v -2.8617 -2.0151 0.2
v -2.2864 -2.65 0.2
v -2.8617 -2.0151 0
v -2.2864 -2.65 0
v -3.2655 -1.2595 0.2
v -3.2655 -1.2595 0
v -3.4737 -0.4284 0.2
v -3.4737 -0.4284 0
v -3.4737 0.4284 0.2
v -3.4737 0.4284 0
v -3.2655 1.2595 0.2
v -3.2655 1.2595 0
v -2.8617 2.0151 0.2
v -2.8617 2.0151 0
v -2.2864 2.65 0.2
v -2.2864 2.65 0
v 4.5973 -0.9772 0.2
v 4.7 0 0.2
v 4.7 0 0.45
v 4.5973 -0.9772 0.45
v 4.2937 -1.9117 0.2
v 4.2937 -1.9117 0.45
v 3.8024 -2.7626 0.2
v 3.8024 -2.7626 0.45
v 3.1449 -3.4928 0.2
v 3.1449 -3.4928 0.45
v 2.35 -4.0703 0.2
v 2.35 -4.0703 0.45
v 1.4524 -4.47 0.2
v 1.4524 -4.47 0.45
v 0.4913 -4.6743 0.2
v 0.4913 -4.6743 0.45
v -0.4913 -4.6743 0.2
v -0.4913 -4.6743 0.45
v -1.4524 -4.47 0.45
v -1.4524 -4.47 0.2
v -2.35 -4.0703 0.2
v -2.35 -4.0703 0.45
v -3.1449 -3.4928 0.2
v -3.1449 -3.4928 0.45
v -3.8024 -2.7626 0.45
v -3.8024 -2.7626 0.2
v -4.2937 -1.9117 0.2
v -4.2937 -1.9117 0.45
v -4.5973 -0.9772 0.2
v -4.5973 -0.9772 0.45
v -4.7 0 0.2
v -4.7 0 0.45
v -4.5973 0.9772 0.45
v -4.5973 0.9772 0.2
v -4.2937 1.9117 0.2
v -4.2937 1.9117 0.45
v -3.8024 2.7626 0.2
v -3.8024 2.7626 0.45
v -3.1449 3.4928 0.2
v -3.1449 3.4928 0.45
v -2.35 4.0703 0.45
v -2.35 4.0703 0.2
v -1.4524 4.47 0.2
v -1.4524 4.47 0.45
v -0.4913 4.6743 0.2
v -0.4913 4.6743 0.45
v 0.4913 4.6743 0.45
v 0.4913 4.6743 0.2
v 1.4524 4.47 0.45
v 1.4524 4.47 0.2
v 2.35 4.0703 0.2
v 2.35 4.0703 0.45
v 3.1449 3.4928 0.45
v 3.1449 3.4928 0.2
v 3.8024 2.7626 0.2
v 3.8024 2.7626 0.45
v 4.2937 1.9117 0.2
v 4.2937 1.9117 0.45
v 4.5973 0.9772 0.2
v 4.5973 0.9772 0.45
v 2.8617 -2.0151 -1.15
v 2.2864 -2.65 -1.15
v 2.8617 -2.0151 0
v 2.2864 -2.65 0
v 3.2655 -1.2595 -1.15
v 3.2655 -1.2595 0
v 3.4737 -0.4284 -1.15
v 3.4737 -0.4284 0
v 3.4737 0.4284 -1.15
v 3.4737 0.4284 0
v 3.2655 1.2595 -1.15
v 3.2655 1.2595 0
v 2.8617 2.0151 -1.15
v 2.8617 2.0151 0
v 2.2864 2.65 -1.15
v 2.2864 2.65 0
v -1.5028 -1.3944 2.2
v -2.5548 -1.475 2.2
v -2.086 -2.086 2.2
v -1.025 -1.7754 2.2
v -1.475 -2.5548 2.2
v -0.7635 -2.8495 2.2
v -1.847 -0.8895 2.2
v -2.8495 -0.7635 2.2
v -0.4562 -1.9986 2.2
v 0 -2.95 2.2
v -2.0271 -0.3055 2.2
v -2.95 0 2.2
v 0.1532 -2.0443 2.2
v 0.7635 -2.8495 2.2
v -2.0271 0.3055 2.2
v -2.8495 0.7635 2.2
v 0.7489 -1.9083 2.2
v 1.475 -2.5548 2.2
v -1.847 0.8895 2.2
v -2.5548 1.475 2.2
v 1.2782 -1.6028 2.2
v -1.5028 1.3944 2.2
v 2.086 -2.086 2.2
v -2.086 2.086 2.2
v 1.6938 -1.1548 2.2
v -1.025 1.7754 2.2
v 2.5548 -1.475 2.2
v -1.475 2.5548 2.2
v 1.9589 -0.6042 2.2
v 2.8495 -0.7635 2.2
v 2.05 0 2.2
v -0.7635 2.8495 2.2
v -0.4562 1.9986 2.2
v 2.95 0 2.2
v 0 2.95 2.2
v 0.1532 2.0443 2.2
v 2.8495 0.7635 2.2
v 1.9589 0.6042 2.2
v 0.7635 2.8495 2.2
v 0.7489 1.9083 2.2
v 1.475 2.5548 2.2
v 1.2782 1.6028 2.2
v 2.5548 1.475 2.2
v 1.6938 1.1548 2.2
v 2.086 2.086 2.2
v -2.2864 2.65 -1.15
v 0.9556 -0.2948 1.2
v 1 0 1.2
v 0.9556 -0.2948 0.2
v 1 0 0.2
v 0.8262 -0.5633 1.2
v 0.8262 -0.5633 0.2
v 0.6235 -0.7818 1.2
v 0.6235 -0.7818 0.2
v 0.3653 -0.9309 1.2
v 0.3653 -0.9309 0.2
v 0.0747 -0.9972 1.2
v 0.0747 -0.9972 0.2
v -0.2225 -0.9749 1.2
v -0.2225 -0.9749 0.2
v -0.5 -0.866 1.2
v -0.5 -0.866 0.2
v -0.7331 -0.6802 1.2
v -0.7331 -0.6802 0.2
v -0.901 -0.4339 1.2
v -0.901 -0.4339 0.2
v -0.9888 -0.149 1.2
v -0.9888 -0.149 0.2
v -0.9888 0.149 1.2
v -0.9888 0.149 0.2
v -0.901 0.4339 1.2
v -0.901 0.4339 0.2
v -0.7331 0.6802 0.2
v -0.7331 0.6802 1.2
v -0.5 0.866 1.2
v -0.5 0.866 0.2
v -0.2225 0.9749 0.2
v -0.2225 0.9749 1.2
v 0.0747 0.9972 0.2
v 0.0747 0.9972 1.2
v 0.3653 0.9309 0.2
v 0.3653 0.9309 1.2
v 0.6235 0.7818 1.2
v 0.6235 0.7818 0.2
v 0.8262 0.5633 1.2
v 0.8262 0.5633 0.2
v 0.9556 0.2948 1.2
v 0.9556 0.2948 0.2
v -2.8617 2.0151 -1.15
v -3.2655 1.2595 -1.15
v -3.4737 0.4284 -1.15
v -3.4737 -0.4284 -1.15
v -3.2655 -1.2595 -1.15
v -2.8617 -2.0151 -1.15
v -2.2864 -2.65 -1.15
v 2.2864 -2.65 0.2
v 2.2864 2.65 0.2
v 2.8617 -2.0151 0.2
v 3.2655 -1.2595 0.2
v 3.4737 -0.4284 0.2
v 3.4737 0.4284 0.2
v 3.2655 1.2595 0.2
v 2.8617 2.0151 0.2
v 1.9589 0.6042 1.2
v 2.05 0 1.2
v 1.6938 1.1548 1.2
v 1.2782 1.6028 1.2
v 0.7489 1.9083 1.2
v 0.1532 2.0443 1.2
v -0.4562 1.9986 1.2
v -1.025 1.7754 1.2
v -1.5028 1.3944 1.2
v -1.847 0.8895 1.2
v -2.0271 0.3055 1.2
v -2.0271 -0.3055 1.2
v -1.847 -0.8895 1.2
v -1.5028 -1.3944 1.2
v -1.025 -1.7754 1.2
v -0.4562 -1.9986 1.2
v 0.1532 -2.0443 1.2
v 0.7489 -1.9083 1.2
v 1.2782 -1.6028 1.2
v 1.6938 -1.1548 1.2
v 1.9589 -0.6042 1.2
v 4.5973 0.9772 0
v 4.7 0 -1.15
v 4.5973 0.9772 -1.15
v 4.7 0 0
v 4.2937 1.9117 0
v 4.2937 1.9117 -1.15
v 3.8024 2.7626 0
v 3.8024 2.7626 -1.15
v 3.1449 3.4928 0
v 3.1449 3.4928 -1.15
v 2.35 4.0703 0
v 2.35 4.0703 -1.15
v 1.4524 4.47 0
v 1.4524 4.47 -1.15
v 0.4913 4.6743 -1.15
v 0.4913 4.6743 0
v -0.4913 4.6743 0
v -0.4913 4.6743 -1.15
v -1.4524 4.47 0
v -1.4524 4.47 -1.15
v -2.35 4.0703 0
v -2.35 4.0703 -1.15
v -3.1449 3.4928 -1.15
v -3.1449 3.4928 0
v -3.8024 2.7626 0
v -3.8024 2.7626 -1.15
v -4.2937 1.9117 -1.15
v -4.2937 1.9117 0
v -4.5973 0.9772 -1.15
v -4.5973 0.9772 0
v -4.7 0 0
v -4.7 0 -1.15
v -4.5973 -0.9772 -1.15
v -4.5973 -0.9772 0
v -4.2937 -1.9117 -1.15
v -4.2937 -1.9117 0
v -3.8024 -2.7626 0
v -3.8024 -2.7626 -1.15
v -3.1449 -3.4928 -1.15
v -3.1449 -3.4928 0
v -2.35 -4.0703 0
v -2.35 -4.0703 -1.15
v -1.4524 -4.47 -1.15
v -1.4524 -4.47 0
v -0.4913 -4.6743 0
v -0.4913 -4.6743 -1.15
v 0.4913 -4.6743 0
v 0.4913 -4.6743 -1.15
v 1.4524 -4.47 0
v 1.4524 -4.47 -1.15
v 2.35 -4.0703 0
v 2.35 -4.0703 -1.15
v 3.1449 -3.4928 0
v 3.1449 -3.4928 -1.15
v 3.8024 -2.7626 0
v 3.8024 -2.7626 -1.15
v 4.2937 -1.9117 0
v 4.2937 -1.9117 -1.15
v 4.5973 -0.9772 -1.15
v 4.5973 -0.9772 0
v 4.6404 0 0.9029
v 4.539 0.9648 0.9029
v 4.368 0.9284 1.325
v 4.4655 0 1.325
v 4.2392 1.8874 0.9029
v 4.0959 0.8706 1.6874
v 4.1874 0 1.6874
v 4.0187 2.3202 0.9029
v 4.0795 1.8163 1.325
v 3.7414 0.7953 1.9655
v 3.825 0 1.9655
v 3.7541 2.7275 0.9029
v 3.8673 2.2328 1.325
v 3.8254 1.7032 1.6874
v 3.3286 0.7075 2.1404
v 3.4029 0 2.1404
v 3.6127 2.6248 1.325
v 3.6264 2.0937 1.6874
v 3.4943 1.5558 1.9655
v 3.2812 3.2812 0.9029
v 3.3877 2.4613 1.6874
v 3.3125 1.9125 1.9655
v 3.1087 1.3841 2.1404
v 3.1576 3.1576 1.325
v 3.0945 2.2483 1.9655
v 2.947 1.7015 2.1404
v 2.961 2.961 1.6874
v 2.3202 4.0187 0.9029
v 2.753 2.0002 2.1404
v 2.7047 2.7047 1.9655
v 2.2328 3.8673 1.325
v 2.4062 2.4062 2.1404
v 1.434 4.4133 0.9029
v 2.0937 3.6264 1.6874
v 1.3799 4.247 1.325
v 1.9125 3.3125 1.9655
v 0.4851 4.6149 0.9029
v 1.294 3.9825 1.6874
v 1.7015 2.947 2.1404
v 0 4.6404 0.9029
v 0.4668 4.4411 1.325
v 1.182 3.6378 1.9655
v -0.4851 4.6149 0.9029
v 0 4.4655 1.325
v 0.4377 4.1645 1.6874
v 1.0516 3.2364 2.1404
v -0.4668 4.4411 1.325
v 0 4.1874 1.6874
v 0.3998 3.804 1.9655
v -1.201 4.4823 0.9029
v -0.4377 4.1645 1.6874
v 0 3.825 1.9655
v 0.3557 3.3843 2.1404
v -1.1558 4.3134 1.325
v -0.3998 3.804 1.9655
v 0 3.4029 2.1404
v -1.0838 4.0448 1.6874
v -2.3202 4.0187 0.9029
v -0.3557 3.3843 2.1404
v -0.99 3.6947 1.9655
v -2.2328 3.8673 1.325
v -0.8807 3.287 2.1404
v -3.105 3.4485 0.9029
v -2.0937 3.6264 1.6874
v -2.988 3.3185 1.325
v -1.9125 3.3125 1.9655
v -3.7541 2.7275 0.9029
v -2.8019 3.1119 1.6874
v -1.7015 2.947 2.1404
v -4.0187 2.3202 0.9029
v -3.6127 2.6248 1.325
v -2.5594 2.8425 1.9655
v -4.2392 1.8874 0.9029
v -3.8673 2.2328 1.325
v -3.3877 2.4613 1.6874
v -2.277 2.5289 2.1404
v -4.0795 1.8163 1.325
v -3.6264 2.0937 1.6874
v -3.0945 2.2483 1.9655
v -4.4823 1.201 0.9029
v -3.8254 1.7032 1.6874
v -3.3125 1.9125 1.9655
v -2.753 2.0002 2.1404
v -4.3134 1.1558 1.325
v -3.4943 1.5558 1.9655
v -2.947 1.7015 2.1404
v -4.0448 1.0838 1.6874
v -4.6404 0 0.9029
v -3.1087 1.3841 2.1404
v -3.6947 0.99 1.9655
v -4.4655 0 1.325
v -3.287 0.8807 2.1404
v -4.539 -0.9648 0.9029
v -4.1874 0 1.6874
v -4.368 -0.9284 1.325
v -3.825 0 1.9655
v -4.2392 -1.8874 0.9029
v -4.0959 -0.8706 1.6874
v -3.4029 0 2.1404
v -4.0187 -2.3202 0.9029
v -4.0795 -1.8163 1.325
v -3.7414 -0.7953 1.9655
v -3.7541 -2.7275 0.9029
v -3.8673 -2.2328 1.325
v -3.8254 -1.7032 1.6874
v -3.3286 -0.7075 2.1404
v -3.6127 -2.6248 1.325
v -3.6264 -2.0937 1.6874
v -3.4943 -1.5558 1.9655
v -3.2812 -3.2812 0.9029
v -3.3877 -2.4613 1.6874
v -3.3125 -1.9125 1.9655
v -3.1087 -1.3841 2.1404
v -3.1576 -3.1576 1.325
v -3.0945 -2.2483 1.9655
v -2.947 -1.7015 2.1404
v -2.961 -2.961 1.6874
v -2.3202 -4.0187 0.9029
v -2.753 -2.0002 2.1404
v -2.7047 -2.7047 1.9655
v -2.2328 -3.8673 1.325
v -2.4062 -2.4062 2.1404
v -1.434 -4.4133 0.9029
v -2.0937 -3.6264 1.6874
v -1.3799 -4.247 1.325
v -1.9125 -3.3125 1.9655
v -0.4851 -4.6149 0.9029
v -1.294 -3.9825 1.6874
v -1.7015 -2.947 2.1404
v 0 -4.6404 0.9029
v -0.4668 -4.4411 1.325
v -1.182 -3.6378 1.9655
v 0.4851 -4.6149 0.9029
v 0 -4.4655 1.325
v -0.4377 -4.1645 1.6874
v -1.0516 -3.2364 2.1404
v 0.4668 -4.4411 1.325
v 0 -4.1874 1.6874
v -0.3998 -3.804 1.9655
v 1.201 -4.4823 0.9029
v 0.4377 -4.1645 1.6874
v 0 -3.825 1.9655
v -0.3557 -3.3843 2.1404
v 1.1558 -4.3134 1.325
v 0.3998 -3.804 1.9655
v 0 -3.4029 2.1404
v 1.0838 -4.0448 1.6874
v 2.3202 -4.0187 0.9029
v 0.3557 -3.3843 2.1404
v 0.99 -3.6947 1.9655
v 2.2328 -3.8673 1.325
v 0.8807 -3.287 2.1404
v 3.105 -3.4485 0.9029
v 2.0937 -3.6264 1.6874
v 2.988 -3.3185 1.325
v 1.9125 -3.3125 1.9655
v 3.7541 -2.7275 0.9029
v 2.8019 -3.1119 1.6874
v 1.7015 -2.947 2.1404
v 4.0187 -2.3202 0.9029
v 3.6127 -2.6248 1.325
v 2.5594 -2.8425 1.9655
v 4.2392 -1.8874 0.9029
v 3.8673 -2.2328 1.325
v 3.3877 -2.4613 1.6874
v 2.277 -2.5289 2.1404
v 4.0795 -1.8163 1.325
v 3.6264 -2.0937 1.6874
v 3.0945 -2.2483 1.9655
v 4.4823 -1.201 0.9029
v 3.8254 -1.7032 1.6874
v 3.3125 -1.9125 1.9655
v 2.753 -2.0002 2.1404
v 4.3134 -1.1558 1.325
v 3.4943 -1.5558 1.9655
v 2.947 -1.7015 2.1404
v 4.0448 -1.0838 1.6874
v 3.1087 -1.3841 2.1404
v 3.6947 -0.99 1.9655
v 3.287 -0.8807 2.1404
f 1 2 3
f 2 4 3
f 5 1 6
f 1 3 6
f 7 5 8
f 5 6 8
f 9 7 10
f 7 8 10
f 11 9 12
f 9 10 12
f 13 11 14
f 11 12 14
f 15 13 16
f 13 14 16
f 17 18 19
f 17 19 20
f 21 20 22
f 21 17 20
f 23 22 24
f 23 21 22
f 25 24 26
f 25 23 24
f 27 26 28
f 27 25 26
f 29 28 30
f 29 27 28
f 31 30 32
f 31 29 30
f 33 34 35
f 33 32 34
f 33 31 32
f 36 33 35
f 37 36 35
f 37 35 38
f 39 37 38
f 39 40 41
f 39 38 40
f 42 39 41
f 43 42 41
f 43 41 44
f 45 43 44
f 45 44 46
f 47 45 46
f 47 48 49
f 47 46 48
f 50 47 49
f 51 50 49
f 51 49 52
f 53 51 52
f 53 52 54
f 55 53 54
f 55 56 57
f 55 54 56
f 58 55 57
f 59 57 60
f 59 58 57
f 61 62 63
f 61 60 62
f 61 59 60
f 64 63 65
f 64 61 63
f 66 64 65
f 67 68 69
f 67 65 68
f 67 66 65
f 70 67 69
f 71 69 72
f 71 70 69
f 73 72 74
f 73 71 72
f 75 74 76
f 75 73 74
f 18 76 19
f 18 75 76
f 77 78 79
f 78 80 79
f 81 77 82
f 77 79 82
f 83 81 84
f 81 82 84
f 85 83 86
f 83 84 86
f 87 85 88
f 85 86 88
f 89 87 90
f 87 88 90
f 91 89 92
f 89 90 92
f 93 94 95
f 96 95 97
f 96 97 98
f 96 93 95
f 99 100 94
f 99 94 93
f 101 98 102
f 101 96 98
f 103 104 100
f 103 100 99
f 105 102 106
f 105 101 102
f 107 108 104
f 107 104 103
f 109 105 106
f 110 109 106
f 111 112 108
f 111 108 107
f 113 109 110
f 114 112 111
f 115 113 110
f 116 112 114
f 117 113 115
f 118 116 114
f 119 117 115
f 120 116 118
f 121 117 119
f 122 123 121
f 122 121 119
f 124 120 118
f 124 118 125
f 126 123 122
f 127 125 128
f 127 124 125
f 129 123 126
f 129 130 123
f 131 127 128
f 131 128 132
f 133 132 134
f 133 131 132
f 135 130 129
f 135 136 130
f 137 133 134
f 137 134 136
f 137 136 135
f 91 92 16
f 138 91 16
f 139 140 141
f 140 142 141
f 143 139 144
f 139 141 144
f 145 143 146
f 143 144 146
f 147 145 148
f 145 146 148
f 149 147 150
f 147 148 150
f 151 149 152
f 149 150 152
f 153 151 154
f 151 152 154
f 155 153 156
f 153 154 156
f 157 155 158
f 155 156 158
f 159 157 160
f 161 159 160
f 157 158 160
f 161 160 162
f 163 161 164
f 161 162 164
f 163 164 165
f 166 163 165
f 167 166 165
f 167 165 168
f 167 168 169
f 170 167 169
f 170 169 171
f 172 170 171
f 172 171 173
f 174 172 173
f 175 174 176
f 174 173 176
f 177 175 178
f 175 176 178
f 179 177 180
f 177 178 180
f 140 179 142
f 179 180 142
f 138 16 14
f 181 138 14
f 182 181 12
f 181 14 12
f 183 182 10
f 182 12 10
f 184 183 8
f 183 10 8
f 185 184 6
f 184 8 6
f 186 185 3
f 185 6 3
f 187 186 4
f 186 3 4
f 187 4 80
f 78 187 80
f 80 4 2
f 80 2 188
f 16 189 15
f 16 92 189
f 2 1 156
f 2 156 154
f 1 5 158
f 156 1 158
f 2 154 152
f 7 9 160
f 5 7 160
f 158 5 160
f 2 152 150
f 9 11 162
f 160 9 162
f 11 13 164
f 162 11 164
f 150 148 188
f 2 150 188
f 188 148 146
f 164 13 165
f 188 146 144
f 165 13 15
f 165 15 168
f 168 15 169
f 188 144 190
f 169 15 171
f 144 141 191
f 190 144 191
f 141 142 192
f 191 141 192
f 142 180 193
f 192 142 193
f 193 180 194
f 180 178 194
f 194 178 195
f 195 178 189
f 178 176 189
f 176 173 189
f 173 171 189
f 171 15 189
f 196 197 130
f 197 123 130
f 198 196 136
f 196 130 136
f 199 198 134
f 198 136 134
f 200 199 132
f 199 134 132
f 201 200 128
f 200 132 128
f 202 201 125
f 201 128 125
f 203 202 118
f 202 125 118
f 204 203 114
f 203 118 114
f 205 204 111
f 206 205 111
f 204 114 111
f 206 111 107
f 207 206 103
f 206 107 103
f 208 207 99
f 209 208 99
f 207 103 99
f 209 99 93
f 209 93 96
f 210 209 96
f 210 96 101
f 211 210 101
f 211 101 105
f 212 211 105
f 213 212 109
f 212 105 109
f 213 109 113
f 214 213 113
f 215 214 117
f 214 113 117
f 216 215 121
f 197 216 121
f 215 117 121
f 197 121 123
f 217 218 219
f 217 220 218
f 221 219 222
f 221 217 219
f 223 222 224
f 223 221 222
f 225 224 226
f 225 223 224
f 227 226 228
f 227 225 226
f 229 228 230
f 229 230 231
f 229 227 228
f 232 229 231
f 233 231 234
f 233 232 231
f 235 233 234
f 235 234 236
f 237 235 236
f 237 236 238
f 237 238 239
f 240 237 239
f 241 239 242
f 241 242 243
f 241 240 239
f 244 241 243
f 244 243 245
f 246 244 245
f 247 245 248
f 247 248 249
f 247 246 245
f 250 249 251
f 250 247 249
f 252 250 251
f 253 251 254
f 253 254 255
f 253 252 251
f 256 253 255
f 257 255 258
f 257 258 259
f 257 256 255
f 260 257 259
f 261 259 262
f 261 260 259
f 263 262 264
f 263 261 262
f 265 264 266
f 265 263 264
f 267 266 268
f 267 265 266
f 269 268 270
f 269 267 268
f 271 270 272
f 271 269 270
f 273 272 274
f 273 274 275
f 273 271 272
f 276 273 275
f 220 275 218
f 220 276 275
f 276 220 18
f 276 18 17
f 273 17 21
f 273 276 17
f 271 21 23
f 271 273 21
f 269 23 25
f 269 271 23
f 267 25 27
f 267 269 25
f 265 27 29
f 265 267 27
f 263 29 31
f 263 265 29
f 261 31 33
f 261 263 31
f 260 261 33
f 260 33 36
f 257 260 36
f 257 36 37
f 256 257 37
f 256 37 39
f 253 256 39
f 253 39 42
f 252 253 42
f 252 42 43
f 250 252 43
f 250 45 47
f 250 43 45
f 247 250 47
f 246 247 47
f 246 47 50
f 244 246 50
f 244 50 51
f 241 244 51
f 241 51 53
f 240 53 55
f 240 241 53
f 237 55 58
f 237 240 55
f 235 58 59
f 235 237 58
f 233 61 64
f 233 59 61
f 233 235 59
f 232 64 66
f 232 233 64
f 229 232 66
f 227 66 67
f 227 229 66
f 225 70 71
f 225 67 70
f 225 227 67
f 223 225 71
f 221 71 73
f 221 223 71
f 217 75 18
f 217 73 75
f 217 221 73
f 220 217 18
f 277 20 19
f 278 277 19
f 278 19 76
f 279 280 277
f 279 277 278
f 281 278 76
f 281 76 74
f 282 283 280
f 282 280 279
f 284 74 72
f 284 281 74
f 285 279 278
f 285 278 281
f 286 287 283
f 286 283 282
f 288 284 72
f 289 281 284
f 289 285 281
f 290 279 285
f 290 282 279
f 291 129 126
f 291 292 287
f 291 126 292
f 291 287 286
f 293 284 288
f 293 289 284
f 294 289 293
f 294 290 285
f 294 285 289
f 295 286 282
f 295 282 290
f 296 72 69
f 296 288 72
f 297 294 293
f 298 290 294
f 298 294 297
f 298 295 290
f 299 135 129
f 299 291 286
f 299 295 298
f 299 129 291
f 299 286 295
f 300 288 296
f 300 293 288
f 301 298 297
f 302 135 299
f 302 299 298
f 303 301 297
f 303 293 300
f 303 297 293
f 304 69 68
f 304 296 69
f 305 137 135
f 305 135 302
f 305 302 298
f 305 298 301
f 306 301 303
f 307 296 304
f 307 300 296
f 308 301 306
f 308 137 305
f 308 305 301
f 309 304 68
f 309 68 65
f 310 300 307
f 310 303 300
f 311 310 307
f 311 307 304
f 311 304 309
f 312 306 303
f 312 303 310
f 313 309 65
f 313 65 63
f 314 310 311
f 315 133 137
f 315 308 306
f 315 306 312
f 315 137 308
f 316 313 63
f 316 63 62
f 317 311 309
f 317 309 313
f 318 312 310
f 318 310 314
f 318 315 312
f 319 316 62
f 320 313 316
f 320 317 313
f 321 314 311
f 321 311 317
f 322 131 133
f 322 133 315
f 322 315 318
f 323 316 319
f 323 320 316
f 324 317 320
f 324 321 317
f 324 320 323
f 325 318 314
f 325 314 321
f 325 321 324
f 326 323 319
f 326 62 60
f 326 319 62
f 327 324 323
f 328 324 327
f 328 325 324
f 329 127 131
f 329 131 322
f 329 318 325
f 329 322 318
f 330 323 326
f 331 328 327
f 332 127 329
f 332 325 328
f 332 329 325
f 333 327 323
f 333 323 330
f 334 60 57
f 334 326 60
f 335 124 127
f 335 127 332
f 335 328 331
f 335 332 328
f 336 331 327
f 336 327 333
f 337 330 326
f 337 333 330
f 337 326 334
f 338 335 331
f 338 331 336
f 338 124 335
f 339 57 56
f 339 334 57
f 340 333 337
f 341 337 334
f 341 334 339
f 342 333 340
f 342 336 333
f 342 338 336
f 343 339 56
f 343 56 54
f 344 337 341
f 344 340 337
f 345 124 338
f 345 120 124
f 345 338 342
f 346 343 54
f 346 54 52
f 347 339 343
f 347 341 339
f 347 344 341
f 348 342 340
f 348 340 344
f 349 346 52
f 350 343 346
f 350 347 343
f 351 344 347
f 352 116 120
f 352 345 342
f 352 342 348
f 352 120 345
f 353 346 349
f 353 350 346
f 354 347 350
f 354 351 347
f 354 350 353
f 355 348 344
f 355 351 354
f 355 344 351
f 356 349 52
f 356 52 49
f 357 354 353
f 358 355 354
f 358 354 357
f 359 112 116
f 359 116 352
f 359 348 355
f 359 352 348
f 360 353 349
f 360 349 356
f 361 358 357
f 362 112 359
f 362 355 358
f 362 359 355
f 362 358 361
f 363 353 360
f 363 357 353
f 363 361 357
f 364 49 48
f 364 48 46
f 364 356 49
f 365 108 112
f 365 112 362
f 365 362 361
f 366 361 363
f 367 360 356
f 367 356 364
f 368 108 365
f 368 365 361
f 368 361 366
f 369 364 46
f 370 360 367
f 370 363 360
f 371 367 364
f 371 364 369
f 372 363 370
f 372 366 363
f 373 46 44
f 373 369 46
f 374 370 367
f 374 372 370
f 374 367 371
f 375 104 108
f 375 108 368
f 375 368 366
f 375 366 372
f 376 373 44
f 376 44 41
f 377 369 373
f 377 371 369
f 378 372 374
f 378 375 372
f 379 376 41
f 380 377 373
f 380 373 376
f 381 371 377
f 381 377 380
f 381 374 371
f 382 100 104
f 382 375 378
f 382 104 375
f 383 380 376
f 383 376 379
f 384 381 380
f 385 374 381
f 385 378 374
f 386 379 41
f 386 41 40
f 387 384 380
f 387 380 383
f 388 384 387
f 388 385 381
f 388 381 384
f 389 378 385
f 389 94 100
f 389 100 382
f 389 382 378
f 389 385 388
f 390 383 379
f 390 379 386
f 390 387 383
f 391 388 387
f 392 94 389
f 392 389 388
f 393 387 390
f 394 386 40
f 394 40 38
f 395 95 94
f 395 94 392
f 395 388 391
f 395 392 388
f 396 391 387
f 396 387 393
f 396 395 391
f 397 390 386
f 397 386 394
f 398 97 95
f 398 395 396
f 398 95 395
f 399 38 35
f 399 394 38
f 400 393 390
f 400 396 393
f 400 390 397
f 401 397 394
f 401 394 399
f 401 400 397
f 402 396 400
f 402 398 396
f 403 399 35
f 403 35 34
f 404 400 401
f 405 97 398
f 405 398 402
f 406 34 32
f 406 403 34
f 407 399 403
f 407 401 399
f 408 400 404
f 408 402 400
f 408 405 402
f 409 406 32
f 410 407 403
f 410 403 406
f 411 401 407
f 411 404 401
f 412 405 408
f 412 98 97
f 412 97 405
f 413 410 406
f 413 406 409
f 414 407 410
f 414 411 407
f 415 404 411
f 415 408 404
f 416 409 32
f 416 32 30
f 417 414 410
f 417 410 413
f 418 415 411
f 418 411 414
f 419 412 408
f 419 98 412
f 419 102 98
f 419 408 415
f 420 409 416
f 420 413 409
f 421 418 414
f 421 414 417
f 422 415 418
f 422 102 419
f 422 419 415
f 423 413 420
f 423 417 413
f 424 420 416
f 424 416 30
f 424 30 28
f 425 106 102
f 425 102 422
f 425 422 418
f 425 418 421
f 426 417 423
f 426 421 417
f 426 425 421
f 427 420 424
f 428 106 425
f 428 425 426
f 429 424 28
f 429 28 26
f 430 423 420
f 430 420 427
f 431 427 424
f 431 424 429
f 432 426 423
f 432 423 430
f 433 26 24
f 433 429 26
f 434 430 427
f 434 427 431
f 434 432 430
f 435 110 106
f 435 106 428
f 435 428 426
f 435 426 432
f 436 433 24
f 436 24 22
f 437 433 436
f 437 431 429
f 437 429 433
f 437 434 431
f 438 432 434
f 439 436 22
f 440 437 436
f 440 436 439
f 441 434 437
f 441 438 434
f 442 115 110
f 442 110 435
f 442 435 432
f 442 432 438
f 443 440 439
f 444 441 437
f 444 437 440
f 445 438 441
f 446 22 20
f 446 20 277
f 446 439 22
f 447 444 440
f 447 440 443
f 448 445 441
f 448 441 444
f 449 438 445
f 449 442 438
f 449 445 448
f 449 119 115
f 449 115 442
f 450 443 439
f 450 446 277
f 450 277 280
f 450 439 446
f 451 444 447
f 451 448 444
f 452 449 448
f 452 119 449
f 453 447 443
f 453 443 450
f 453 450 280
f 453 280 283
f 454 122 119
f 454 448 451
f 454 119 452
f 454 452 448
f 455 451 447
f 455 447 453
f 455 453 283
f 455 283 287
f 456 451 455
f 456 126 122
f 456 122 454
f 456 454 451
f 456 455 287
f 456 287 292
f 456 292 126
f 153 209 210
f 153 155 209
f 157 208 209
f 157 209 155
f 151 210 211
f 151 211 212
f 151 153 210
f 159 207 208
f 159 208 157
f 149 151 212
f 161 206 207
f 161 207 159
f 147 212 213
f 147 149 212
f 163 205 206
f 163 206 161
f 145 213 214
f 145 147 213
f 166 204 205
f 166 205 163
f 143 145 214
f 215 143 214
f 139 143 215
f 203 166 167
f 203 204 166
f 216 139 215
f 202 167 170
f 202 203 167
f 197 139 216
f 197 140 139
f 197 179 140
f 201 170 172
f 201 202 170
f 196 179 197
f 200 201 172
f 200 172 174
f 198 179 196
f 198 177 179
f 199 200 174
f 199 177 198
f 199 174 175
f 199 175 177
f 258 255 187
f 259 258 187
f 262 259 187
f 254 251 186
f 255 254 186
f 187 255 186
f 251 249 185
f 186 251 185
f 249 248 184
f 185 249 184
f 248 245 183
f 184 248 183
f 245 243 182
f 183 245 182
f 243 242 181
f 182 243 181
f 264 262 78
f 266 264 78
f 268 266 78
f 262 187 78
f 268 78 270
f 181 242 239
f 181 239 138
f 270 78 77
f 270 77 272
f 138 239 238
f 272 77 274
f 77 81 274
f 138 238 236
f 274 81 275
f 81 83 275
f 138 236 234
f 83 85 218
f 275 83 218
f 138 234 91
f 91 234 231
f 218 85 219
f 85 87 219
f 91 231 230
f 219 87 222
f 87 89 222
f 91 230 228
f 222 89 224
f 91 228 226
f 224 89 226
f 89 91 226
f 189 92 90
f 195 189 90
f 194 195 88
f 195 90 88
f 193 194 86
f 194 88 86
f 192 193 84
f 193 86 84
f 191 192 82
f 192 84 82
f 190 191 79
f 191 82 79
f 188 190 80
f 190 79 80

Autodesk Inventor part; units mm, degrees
ref_plane "YZ Plane" through (0, 0, 0) normal (1, 0, 0) x (0, 1, 0)
ref_plane "XZ Plane" through (0, 0, 0) normal (0, 1, 0) x (-1, 0, 0)
sketch "Sketch1" plane through (0, 0, 0) normal (0, 0, 1) x (1, 0, 0)
  circle A0 centre (0, 0) radius 4.7 projected
  circle A1 centre (0, 0) radius 1 projected
  arc A2 (-2.2864, 2.65) -> (-2.2864, -2.65) centre (0, 0) ccw
  line L0 (-2.2864, -2.65) -> (2.2864, -2.65)
  line L1 (2.2864, 2.65) -> (-2.2864, 2.65)
  arc A3 (2.2864, -2.65) -> (2.2864, 2.65) centre (0, 0) ccw
ref_plane "Work Plane1" through (-12.875, -12.875, -1.15) normal (0, 0, 1) x (1, 0, 0)
extrude "Extrusion1" add sketch "Sketch1" along normal blind 0.2 and the other way blind 1.15 contours A0
sketch "Sketch2" plane through (0, 0, 0.2) normal (0, 0, 1) x (1, 0, 0)
  circle A0 centre (0, 0) radius 4.7 projected
  circle A1 centre (0, 0) radius 1 projected
extrude "Extrusion2" add sketch "Sketch2" along normal blind 2
fillet "Fillet1" radius 1.75 1 edges at (-4.7, 0, 2.2)
sketch "Sketch3" plane through (0, 0, 2.2) normal (0, 0, 1) x (1, 0, 0)
  circle A0 centre (0, 0) radius 2.05
  circle A1 centre (0, 0) radius 1 projected
  point P0 (0, 0)
  dimension "d7" = 4.1
extrude "Extrusion3" cut sketch "Sketch3" against normal blind 1 contours A0 | A1
properties part number "TTencodercap"
